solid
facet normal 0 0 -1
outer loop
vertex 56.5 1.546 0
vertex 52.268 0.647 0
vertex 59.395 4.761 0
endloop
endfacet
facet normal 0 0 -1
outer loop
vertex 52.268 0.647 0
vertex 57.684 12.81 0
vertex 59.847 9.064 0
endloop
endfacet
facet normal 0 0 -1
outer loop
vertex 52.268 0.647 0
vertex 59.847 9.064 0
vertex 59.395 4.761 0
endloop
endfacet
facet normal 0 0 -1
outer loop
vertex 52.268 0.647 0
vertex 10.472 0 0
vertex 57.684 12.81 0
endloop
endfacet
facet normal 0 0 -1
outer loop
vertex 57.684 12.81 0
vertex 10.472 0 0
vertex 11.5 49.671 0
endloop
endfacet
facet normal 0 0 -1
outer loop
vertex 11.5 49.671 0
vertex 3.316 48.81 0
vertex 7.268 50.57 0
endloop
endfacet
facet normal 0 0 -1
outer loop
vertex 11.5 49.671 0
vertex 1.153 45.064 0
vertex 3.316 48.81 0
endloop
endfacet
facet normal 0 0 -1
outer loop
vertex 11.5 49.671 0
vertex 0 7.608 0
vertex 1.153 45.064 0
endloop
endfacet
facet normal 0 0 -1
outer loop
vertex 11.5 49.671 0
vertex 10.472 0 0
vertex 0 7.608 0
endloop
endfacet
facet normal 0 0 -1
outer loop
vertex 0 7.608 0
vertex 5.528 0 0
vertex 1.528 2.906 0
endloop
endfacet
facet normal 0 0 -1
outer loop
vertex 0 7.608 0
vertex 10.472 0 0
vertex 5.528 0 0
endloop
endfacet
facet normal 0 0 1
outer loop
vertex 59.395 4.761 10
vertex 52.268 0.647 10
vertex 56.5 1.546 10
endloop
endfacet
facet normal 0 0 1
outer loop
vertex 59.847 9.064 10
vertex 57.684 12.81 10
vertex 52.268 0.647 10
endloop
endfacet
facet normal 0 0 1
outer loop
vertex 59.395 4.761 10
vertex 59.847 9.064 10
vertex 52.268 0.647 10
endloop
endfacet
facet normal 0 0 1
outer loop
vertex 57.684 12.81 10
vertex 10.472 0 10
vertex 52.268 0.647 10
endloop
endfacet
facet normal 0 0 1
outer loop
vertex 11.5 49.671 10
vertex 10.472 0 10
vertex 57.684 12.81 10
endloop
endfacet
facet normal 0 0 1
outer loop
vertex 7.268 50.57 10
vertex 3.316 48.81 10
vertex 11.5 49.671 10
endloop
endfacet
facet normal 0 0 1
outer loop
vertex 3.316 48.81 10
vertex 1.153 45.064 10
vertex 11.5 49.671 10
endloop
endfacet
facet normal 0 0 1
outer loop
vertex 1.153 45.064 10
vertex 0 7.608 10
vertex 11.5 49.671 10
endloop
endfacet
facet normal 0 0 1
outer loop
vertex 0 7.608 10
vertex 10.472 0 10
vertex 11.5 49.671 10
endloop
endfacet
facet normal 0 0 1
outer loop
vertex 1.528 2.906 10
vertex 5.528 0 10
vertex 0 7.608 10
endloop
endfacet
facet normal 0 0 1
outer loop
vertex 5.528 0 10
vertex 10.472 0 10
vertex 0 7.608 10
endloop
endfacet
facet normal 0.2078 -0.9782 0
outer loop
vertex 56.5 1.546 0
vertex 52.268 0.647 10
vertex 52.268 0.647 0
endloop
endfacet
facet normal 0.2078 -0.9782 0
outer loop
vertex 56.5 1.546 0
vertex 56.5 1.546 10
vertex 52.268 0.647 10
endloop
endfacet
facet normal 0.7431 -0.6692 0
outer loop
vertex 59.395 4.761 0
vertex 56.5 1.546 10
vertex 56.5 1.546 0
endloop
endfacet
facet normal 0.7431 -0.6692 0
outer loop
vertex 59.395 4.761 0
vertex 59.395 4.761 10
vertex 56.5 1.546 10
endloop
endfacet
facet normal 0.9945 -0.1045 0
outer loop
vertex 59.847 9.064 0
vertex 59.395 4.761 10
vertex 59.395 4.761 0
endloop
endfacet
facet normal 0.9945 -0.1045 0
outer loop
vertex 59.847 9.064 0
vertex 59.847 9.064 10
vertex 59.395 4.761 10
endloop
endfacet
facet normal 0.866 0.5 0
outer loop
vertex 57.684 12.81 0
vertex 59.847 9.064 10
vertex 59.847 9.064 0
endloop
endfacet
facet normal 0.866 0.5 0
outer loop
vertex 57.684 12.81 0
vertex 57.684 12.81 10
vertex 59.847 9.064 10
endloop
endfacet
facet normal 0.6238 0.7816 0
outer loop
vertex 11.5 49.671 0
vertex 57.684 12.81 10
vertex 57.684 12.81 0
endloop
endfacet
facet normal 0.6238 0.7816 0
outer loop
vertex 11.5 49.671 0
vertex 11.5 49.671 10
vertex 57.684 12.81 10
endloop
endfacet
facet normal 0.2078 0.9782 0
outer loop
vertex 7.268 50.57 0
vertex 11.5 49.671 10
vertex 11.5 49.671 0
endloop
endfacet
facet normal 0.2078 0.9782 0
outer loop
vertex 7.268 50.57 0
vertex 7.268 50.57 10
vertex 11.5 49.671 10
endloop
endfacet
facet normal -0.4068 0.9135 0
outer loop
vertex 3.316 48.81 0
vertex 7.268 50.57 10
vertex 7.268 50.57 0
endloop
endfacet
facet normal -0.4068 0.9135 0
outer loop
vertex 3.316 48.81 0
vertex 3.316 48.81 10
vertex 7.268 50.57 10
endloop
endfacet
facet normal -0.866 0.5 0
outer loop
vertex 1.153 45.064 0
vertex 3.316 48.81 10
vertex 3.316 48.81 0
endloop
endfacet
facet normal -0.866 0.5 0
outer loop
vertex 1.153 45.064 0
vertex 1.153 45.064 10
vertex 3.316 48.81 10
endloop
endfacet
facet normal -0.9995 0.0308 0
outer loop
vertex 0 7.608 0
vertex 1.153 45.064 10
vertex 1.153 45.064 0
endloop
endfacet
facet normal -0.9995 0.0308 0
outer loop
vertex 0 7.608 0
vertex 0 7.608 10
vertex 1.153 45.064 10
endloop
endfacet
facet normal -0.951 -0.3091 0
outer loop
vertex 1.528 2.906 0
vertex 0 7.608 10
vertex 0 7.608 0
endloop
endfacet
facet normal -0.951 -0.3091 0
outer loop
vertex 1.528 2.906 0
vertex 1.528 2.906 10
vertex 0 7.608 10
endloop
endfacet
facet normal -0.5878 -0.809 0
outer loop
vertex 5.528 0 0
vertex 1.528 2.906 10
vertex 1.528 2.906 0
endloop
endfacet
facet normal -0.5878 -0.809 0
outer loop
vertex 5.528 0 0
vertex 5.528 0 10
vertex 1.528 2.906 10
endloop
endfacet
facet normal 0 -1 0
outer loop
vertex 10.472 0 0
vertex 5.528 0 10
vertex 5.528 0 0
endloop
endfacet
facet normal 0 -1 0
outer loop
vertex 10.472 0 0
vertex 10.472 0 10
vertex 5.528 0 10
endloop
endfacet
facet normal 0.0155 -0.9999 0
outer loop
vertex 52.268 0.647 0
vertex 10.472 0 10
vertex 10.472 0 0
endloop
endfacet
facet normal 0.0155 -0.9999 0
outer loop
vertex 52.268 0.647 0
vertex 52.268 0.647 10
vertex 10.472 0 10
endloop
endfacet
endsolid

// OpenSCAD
$fn = 32;

// ----------------------------------------------------------------------
// Lever arm: two bosses 16 and 14 mm, 45 mm between centres
// ----------------------------------------------------------------------

// --- parameters (mm) ---
profile_height = 10;      // extrusion height
profile_points = 13;      // points of the closed outline

profile = [[0, 7.608], [1.528, 2.906], [5.528, 0], [10.472, 0], [52.268, 0.647], [56.5, 1.546], [59.395, 4.761], [59.847, 9.064], [57.684, 12.81], [11.5, 49.671], [7.268, 50.57], [3.316, 48.81], [1.153, 45.064]];  // single closed polygon, 13 points, counter clockwise

// --- the one profile operation ---
linear_extrude(height = profile_height) polygon(points = profile);
